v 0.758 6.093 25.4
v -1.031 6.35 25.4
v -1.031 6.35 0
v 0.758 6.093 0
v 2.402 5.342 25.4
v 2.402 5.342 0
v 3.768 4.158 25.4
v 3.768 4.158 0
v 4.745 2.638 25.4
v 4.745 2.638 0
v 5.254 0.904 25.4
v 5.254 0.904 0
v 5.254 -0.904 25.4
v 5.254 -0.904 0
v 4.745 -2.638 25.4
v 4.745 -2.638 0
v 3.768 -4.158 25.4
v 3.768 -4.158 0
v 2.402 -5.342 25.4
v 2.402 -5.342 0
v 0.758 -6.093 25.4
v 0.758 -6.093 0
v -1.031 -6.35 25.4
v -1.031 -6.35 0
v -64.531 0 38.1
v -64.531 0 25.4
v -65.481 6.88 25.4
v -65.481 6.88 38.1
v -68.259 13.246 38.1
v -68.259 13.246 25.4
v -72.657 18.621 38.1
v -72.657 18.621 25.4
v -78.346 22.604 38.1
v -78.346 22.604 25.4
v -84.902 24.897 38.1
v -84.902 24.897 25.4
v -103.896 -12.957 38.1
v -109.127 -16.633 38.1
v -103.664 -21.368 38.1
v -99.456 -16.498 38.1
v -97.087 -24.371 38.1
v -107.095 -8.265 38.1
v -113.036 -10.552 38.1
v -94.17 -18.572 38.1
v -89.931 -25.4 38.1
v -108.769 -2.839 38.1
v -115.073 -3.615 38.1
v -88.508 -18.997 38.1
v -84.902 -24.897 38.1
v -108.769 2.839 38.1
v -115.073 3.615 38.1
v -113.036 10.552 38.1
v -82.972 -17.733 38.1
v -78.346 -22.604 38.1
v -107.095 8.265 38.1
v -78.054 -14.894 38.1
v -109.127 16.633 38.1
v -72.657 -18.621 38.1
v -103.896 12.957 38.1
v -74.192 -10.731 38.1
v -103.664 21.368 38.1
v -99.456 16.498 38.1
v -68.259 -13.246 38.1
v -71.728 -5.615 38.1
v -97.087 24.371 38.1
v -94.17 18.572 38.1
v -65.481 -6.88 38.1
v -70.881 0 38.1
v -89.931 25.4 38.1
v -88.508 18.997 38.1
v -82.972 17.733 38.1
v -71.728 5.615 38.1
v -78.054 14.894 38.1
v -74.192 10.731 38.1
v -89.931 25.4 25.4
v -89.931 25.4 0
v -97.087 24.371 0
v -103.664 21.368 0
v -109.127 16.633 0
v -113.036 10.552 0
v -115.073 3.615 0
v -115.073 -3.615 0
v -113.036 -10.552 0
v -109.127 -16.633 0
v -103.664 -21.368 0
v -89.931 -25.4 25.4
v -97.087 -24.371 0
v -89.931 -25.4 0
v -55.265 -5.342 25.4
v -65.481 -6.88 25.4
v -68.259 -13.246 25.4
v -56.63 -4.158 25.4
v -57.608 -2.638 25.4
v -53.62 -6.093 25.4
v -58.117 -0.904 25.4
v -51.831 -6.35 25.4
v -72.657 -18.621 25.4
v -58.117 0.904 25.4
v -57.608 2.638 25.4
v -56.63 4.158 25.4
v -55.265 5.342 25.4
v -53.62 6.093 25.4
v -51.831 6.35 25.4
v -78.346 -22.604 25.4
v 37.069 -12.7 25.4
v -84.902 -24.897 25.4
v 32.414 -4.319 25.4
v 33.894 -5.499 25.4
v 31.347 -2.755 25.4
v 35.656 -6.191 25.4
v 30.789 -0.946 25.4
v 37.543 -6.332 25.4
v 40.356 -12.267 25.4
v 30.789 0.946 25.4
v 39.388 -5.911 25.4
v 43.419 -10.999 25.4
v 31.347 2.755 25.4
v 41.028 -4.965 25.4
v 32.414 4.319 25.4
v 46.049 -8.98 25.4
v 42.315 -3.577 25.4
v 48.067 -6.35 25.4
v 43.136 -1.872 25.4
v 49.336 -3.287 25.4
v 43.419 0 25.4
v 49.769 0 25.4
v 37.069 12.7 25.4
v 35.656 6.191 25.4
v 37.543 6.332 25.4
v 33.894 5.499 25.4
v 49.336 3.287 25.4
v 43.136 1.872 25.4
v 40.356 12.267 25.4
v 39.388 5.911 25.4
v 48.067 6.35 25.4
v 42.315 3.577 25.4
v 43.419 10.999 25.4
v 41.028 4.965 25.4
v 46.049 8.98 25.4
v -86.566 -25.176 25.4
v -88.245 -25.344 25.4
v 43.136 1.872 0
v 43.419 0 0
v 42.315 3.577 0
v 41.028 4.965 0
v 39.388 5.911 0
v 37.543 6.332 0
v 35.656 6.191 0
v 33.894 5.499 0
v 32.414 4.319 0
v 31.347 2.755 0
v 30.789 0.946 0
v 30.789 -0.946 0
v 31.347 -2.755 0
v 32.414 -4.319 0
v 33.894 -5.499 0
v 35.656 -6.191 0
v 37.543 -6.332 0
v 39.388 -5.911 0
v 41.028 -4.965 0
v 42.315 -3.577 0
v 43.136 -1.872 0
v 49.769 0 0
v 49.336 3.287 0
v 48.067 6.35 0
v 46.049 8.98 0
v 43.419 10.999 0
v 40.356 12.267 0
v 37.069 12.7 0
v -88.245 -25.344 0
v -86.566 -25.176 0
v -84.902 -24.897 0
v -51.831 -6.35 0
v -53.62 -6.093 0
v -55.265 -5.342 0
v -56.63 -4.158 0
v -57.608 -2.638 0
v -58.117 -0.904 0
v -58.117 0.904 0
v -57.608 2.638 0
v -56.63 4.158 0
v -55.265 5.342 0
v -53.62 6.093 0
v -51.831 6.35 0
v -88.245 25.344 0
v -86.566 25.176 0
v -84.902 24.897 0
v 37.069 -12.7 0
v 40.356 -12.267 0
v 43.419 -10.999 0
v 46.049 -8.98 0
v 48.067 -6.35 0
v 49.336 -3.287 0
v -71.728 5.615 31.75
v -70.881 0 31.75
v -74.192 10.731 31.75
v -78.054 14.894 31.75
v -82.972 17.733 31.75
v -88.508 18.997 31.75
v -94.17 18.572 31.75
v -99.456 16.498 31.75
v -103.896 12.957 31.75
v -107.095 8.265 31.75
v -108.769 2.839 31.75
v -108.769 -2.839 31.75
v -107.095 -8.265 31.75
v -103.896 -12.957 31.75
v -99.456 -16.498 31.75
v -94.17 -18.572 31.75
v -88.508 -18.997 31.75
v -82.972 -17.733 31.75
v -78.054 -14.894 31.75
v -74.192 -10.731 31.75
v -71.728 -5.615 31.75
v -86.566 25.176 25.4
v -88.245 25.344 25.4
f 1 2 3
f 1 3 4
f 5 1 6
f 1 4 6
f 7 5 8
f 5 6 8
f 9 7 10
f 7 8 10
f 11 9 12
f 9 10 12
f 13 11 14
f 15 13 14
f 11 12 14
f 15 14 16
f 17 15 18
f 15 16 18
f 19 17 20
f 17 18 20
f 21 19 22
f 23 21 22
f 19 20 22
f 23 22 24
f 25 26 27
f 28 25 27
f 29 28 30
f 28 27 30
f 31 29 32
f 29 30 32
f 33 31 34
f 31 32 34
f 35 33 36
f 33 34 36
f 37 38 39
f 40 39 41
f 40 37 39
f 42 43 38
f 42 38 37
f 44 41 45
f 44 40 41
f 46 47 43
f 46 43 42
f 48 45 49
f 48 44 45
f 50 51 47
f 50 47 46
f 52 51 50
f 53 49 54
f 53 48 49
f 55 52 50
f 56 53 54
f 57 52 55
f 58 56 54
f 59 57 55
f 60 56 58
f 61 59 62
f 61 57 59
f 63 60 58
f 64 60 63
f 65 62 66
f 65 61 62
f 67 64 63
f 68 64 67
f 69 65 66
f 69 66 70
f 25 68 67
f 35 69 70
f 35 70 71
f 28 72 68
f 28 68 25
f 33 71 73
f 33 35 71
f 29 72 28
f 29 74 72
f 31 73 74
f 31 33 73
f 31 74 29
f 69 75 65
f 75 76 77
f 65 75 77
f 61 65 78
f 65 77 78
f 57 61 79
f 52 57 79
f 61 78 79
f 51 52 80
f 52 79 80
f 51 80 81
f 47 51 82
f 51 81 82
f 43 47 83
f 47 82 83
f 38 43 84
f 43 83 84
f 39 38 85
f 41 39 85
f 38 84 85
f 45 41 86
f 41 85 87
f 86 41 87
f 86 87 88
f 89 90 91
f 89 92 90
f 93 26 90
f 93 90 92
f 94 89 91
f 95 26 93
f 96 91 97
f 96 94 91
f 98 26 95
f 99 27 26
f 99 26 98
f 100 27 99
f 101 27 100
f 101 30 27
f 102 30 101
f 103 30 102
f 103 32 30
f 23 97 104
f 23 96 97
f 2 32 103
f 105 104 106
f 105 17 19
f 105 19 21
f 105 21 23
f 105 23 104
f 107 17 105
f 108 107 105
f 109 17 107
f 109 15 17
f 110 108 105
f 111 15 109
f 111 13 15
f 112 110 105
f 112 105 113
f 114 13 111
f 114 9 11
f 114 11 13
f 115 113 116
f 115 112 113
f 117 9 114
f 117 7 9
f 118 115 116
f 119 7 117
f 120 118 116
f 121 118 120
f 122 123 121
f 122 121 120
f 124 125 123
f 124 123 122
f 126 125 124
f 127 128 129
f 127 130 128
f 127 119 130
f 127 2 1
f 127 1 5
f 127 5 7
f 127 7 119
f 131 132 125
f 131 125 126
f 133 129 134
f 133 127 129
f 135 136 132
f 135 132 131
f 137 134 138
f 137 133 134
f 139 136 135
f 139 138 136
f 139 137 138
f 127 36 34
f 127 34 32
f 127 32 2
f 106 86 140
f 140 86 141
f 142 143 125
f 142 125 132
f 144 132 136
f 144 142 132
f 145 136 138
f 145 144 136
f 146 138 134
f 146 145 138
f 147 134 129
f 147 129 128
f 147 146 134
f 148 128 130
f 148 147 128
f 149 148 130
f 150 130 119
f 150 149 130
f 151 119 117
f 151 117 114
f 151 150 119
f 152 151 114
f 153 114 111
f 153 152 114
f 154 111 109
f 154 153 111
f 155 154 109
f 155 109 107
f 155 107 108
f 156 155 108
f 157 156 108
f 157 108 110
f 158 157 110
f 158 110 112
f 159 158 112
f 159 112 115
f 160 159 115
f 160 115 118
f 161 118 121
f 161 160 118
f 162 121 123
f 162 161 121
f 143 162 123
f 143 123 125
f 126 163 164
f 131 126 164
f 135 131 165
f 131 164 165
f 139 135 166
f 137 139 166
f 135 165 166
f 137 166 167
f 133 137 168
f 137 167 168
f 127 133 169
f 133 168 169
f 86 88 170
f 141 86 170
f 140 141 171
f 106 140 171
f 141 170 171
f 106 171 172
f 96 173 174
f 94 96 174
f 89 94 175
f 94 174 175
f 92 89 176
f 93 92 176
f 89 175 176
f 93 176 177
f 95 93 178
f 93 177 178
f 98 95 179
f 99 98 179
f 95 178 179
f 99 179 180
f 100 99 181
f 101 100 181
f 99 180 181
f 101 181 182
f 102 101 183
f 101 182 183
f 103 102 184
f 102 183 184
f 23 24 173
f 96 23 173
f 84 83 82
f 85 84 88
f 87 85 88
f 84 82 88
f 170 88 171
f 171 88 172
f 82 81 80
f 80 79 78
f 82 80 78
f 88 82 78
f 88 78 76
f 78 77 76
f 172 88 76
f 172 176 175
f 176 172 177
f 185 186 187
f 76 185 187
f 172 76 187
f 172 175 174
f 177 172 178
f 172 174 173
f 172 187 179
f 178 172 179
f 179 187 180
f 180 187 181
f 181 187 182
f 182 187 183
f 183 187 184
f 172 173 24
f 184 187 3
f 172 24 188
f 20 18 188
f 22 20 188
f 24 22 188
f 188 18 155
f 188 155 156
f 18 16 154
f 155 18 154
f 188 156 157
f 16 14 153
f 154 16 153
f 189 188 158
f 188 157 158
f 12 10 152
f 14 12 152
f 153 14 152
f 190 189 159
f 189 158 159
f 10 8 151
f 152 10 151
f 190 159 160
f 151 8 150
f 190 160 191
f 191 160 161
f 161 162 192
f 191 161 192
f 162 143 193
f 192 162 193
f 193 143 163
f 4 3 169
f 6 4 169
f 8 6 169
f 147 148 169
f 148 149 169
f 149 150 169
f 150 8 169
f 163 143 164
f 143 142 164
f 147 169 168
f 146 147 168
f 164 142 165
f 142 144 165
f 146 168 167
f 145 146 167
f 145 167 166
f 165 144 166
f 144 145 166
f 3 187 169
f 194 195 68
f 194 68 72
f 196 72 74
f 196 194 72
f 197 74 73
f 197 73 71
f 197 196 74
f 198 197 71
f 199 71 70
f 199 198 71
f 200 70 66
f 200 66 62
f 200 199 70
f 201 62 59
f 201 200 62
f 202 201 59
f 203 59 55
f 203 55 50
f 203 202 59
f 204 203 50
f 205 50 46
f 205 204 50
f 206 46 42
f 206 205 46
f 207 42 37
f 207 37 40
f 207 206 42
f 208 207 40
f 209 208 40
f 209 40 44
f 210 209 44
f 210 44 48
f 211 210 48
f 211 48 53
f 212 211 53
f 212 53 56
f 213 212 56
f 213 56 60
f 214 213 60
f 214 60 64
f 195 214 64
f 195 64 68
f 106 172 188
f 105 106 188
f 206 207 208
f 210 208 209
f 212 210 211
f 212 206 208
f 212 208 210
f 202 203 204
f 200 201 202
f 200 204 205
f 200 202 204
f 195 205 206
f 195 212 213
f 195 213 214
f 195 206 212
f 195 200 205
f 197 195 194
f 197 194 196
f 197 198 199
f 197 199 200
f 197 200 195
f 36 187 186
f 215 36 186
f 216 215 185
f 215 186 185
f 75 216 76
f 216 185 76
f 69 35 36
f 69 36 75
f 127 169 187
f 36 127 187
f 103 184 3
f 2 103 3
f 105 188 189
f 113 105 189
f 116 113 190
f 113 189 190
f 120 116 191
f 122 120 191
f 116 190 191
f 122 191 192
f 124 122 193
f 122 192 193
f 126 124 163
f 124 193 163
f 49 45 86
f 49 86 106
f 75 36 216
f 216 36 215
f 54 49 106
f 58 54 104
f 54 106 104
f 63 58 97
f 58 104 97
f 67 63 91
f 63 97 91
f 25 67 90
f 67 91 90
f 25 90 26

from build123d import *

# Parameters (mm, degrees)
F0_R     = 19.05
F1_DEPTH = 38.1
F2_DEPTH = 31.75
F0_R_2   = 6.35
F3_DEPTH = 25.4


with BuildPart() as f1:
    # F0 (on Top) → F1 (new body)
    with BuildSketch(Plane.XY):
        with BuildLine():
            Line((-84.90175, 24.89703), (-89.931453, 25.4))
            ThreePointArc((-89.931453, 25.4), (-115.331453, 0), (-89.931453, -25.4))
            Line((-89.931453, -25.4), (-84.90175, -24.89703))
            ThreePointArc((-84.90175, -24.89703), (-70.272937, -16.08424), (-64.531453, 0))
            ThreePointArc((-64.531453, 0), (-70.272937, 16.08424), (-84.90175, 24.89703))
        make_face()
        with Locations((-89.931453, 0)):
            Circle(F0_R, mode=Mode.SUBTRACT)
    extrude(amount=F1_DEPTH)

    # F0 (on Top) → F2 (join)
    with BuildSketch(Plane.XY):
        with Locations((-89.931453, 0)):
            Circle(F0_R)
    extrude(amount=F2_DEPTH)

    # F0 (on Top) → F3 (join)
    with BuildSketch(Plane.XY):
        with BuildLine():
            Line((-84.90175, 24.89703), (-89.931453, 25.4))
            ThreePointArc((-89.931453, 25.4), (-115.331453, 0), (-89.931453, -25.4))
            Line((-89.931453, -25.4), (-84.90175, -24.89703))
            ThreePointArc((-84.90175, -24.89703), (-70.272937, -16.08424), (-64.531453, 0))
            ThreePointArc((-64.531453, 0), (-70.272937, 16.08424), (-84.90175, 24.89703))
        make_face()
        with Locations((-89.931453, 0)):
            Circle(F0_R, mode=Mode.SUBTRACT)
        with BuildLine():
            ThreePointArc((-84.90175, 24.89703), (-87.404058, 25.273945), (-89.931453, 25.4))
            Line((-89.931453, 25.4), (-84.90175, 24.89703))
        make_face()
        with BuildLine():
            Line((-84.90175, -24.89703), (-89.931453, -25.4))
            ThreePointArc((-89.931453, -25.4), (-87.404058, -25.273945), (-84.90175, -24.89703))
        make_face()
        with BuildLine():
            Line((37.068547, 12.7), (-84.90175, 24.89703))
            ThreePointArc((-84.90175, 24.89703), (-70.272937, 16.08424), (-64.531453, 0))
            ThreePointArc((-64.531453, 0), (-70.272937, -16.08424), (-84.90175, -24.89703))
            Line((-84.90175, -24.89703), (37.068547, -12.7))
            ThreePointArc((37.068547, -12.7), (24.368547, 0), (37.068547, 12.7))
        make_face()
        with BuildLine():
            ThreePointArc((-51.831453, -6.35), (-58.181453, 0), (-51.831453, 6.35))
            Line((-51.831453, 6.35), (-1.031453, 6.35))
            ThreePointArc((-1.031453, 6.35), (5.318547, 0), (-1.031453, -6.35))
            Line((-1.031453, -6.35), (-51.831453, -6.35))
        make_face(mode=Mode.SUBTRACT)
        with BuildLine():
            ThreePointArc((49.768547, 0), (46.048803, 8.980256), (37.068547, 12.7))
            ThreePointArc((37.068547, 12.7), (24.368547, 0), (37.068547, -12.7))
            ThreePointArc((37.068547, -12.7), (46.048803, -8.980256), (49.768547, 0))
        make_face()
        with Locations((37.068547, 0)):
            Circle(F0_R_2, mode=Mode.SUBTRACT)
    extrude(amount=F3_DEPTH)


solid = f1.part
